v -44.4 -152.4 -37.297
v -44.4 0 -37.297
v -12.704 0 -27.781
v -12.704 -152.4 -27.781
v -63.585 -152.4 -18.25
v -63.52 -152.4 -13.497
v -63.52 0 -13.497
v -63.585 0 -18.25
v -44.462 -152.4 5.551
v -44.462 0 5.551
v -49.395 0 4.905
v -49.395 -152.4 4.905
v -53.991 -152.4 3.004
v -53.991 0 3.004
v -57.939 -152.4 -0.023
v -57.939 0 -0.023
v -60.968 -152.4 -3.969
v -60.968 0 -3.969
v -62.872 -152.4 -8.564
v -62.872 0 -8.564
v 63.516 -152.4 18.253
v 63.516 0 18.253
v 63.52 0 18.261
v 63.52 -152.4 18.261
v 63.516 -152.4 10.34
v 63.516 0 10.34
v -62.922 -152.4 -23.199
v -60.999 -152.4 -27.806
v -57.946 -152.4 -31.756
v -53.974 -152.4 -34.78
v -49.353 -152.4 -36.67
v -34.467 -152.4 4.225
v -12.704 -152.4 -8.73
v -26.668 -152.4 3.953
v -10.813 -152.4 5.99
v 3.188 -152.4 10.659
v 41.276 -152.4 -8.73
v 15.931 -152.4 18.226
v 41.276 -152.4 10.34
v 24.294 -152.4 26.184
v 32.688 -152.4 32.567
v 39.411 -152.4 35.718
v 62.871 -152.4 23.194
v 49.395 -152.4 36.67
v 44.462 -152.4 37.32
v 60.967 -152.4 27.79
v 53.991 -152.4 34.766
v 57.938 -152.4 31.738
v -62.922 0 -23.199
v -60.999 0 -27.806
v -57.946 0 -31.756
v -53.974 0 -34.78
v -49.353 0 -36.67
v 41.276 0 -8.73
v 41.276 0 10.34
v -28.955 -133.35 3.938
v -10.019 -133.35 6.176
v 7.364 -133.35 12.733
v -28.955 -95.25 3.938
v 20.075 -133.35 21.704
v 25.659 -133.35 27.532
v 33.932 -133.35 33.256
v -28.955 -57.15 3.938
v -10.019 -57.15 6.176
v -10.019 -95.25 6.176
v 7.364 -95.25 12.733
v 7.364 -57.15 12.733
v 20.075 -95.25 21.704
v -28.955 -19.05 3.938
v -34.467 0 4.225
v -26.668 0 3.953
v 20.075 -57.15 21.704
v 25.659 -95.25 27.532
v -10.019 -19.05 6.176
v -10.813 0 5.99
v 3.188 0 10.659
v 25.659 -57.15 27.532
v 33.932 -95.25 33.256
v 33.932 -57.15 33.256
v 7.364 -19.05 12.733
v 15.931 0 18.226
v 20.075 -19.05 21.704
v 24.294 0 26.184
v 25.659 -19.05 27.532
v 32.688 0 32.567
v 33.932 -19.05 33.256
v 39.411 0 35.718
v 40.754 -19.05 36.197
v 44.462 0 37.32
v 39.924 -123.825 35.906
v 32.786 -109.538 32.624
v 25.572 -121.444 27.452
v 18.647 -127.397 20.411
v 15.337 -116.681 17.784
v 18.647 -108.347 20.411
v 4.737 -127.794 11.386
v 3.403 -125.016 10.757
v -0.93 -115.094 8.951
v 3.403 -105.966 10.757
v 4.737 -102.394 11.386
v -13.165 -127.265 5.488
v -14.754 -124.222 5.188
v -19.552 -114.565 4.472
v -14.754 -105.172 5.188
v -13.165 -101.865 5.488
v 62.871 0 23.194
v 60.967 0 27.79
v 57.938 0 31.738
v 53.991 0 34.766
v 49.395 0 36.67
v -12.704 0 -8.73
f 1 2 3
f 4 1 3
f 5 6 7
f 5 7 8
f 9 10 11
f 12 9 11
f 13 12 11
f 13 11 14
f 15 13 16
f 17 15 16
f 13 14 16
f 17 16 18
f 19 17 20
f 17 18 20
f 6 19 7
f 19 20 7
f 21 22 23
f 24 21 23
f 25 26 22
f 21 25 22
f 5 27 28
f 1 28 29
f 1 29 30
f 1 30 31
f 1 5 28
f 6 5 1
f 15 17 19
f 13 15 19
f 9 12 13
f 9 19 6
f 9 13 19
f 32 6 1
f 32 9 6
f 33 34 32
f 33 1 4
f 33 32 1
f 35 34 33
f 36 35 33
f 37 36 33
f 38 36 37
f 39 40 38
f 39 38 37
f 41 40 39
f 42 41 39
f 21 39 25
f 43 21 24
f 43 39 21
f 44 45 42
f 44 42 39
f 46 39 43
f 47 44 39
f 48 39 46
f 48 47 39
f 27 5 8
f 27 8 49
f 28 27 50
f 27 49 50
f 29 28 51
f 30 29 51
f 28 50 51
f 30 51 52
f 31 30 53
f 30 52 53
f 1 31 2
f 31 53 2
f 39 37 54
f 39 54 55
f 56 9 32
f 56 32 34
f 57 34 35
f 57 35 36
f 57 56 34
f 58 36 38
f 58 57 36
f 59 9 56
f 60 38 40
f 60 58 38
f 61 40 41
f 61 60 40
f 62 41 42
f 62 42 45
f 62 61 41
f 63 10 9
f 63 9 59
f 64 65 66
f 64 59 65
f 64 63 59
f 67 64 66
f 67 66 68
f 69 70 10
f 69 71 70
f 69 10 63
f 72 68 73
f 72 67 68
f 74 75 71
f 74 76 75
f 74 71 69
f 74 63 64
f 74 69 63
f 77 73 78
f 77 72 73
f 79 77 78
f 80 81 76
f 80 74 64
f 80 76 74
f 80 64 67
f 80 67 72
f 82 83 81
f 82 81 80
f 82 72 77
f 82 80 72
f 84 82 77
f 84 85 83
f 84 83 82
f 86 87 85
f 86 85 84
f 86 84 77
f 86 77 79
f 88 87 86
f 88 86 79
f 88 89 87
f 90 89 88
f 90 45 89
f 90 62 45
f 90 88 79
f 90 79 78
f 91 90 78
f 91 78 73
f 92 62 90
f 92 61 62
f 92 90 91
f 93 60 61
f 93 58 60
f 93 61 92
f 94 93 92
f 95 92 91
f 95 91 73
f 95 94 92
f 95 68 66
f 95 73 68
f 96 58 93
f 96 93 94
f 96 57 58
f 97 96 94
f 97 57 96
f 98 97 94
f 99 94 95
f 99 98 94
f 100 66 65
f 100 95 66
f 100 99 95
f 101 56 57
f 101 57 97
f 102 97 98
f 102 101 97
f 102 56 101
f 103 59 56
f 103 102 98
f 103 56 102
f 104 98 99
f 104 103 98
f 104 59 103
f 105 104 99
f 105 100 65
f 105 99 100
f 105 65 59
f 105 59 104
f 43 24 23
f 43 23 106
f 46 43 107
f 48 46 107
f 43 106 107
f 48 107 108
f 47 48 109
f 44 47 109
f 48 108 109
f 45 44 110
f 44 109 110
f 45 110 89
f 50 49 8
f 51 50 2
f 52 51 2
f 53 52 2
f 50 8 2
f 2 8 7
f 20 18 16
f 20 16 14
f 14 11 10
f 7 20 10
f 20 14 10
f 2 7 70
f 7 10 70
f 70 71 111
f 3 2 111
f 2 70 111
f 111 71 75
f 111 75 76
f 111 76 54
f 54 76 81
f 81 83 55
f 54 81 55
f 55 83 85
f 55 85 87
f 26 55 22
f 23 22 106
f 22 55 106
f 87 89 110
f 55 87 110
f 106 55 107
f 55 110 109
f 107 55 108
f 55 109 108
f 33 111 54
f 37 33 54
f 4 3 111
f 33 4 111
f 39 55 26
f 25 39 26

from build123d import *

# Parameters (mm, degrees)
F1_DEPTH = 152.4


# Not quite as in the source:
# - a feature of the source that left no trace in its solid (it failed there, or was rolled back) is left out


with BuildPart() as f1:
    # F0 (on Front) → F1 (new body)
    with BuildSketch(Plane.XZ):
        with BuildLine():
            Line((63.5156407952, 10.3399762884), (63.5156407952, 18.2530842721))
            Line((63.5156407952, 18.2530842721), (63.5201856653, 18.2612892249))
            ThreePointArc((63.5201856653, 18.2612892249), (57.9382188033, 31.7375402421), (44.462159276, 37.3199693859))
            add(Edge.make_bspline(
                [(-44.4622051984, 5.5512220147), (-39.4489640202, 4.7743889629), (-28.8914565164, 3.1384371939), (-9.7165157973, 5.4821340103), (7.2225801678, 11.7489232999), (20.3909952314, 21.2138869863), (25.1500405302, 27.747417878), (33.6683098111, 33.4923986759), (40.5448826371, 36.2228742762), (43.3047932524, 36.9958307759), (44.462159276, 37.3199693859)],
                knots=[0, 0, 0, 0, 0.1447564987, 0.3048462595, 0.4628693182, 0.6074722668, 0.711629737, 0.827910892, 0.927834588, 1, 1, 1, 1], degree=3))
            ThreePointArc((-44.4622051984, 5.5512220147), (-57.9390215503, -0.0226415893), (-63.5199193484, -13.4965465253))
            Line((-63.5199193484, -13.4965465253), (-63.5854476605, -18.2502795355))
            ThreePointArc((-63.5854476605, -18.2502795355), (-57.9464666974, -31.7561163984), (-44.400241226, -37.2973717749))
            Line((-44.400241226, -37.2973717749), (-12.7040622756, -27.7813021094))
            Line((-12.7040622756, -27.7813021094), (-12.7040622756, -8.7301339954))
            Line((-12.7040622756, -8.7301339954), (41.2755347788, -8.7301339954))
            Line((41.2755347788, -8.7301339954), (41.2755347788, 10.3399762884))
            Line((41.2755347788, 10.3399762884), (63.5156407952, 10.3399762884))
        make_face()
    extrude(amount=F1_DEPTH)


solid = f1.part
